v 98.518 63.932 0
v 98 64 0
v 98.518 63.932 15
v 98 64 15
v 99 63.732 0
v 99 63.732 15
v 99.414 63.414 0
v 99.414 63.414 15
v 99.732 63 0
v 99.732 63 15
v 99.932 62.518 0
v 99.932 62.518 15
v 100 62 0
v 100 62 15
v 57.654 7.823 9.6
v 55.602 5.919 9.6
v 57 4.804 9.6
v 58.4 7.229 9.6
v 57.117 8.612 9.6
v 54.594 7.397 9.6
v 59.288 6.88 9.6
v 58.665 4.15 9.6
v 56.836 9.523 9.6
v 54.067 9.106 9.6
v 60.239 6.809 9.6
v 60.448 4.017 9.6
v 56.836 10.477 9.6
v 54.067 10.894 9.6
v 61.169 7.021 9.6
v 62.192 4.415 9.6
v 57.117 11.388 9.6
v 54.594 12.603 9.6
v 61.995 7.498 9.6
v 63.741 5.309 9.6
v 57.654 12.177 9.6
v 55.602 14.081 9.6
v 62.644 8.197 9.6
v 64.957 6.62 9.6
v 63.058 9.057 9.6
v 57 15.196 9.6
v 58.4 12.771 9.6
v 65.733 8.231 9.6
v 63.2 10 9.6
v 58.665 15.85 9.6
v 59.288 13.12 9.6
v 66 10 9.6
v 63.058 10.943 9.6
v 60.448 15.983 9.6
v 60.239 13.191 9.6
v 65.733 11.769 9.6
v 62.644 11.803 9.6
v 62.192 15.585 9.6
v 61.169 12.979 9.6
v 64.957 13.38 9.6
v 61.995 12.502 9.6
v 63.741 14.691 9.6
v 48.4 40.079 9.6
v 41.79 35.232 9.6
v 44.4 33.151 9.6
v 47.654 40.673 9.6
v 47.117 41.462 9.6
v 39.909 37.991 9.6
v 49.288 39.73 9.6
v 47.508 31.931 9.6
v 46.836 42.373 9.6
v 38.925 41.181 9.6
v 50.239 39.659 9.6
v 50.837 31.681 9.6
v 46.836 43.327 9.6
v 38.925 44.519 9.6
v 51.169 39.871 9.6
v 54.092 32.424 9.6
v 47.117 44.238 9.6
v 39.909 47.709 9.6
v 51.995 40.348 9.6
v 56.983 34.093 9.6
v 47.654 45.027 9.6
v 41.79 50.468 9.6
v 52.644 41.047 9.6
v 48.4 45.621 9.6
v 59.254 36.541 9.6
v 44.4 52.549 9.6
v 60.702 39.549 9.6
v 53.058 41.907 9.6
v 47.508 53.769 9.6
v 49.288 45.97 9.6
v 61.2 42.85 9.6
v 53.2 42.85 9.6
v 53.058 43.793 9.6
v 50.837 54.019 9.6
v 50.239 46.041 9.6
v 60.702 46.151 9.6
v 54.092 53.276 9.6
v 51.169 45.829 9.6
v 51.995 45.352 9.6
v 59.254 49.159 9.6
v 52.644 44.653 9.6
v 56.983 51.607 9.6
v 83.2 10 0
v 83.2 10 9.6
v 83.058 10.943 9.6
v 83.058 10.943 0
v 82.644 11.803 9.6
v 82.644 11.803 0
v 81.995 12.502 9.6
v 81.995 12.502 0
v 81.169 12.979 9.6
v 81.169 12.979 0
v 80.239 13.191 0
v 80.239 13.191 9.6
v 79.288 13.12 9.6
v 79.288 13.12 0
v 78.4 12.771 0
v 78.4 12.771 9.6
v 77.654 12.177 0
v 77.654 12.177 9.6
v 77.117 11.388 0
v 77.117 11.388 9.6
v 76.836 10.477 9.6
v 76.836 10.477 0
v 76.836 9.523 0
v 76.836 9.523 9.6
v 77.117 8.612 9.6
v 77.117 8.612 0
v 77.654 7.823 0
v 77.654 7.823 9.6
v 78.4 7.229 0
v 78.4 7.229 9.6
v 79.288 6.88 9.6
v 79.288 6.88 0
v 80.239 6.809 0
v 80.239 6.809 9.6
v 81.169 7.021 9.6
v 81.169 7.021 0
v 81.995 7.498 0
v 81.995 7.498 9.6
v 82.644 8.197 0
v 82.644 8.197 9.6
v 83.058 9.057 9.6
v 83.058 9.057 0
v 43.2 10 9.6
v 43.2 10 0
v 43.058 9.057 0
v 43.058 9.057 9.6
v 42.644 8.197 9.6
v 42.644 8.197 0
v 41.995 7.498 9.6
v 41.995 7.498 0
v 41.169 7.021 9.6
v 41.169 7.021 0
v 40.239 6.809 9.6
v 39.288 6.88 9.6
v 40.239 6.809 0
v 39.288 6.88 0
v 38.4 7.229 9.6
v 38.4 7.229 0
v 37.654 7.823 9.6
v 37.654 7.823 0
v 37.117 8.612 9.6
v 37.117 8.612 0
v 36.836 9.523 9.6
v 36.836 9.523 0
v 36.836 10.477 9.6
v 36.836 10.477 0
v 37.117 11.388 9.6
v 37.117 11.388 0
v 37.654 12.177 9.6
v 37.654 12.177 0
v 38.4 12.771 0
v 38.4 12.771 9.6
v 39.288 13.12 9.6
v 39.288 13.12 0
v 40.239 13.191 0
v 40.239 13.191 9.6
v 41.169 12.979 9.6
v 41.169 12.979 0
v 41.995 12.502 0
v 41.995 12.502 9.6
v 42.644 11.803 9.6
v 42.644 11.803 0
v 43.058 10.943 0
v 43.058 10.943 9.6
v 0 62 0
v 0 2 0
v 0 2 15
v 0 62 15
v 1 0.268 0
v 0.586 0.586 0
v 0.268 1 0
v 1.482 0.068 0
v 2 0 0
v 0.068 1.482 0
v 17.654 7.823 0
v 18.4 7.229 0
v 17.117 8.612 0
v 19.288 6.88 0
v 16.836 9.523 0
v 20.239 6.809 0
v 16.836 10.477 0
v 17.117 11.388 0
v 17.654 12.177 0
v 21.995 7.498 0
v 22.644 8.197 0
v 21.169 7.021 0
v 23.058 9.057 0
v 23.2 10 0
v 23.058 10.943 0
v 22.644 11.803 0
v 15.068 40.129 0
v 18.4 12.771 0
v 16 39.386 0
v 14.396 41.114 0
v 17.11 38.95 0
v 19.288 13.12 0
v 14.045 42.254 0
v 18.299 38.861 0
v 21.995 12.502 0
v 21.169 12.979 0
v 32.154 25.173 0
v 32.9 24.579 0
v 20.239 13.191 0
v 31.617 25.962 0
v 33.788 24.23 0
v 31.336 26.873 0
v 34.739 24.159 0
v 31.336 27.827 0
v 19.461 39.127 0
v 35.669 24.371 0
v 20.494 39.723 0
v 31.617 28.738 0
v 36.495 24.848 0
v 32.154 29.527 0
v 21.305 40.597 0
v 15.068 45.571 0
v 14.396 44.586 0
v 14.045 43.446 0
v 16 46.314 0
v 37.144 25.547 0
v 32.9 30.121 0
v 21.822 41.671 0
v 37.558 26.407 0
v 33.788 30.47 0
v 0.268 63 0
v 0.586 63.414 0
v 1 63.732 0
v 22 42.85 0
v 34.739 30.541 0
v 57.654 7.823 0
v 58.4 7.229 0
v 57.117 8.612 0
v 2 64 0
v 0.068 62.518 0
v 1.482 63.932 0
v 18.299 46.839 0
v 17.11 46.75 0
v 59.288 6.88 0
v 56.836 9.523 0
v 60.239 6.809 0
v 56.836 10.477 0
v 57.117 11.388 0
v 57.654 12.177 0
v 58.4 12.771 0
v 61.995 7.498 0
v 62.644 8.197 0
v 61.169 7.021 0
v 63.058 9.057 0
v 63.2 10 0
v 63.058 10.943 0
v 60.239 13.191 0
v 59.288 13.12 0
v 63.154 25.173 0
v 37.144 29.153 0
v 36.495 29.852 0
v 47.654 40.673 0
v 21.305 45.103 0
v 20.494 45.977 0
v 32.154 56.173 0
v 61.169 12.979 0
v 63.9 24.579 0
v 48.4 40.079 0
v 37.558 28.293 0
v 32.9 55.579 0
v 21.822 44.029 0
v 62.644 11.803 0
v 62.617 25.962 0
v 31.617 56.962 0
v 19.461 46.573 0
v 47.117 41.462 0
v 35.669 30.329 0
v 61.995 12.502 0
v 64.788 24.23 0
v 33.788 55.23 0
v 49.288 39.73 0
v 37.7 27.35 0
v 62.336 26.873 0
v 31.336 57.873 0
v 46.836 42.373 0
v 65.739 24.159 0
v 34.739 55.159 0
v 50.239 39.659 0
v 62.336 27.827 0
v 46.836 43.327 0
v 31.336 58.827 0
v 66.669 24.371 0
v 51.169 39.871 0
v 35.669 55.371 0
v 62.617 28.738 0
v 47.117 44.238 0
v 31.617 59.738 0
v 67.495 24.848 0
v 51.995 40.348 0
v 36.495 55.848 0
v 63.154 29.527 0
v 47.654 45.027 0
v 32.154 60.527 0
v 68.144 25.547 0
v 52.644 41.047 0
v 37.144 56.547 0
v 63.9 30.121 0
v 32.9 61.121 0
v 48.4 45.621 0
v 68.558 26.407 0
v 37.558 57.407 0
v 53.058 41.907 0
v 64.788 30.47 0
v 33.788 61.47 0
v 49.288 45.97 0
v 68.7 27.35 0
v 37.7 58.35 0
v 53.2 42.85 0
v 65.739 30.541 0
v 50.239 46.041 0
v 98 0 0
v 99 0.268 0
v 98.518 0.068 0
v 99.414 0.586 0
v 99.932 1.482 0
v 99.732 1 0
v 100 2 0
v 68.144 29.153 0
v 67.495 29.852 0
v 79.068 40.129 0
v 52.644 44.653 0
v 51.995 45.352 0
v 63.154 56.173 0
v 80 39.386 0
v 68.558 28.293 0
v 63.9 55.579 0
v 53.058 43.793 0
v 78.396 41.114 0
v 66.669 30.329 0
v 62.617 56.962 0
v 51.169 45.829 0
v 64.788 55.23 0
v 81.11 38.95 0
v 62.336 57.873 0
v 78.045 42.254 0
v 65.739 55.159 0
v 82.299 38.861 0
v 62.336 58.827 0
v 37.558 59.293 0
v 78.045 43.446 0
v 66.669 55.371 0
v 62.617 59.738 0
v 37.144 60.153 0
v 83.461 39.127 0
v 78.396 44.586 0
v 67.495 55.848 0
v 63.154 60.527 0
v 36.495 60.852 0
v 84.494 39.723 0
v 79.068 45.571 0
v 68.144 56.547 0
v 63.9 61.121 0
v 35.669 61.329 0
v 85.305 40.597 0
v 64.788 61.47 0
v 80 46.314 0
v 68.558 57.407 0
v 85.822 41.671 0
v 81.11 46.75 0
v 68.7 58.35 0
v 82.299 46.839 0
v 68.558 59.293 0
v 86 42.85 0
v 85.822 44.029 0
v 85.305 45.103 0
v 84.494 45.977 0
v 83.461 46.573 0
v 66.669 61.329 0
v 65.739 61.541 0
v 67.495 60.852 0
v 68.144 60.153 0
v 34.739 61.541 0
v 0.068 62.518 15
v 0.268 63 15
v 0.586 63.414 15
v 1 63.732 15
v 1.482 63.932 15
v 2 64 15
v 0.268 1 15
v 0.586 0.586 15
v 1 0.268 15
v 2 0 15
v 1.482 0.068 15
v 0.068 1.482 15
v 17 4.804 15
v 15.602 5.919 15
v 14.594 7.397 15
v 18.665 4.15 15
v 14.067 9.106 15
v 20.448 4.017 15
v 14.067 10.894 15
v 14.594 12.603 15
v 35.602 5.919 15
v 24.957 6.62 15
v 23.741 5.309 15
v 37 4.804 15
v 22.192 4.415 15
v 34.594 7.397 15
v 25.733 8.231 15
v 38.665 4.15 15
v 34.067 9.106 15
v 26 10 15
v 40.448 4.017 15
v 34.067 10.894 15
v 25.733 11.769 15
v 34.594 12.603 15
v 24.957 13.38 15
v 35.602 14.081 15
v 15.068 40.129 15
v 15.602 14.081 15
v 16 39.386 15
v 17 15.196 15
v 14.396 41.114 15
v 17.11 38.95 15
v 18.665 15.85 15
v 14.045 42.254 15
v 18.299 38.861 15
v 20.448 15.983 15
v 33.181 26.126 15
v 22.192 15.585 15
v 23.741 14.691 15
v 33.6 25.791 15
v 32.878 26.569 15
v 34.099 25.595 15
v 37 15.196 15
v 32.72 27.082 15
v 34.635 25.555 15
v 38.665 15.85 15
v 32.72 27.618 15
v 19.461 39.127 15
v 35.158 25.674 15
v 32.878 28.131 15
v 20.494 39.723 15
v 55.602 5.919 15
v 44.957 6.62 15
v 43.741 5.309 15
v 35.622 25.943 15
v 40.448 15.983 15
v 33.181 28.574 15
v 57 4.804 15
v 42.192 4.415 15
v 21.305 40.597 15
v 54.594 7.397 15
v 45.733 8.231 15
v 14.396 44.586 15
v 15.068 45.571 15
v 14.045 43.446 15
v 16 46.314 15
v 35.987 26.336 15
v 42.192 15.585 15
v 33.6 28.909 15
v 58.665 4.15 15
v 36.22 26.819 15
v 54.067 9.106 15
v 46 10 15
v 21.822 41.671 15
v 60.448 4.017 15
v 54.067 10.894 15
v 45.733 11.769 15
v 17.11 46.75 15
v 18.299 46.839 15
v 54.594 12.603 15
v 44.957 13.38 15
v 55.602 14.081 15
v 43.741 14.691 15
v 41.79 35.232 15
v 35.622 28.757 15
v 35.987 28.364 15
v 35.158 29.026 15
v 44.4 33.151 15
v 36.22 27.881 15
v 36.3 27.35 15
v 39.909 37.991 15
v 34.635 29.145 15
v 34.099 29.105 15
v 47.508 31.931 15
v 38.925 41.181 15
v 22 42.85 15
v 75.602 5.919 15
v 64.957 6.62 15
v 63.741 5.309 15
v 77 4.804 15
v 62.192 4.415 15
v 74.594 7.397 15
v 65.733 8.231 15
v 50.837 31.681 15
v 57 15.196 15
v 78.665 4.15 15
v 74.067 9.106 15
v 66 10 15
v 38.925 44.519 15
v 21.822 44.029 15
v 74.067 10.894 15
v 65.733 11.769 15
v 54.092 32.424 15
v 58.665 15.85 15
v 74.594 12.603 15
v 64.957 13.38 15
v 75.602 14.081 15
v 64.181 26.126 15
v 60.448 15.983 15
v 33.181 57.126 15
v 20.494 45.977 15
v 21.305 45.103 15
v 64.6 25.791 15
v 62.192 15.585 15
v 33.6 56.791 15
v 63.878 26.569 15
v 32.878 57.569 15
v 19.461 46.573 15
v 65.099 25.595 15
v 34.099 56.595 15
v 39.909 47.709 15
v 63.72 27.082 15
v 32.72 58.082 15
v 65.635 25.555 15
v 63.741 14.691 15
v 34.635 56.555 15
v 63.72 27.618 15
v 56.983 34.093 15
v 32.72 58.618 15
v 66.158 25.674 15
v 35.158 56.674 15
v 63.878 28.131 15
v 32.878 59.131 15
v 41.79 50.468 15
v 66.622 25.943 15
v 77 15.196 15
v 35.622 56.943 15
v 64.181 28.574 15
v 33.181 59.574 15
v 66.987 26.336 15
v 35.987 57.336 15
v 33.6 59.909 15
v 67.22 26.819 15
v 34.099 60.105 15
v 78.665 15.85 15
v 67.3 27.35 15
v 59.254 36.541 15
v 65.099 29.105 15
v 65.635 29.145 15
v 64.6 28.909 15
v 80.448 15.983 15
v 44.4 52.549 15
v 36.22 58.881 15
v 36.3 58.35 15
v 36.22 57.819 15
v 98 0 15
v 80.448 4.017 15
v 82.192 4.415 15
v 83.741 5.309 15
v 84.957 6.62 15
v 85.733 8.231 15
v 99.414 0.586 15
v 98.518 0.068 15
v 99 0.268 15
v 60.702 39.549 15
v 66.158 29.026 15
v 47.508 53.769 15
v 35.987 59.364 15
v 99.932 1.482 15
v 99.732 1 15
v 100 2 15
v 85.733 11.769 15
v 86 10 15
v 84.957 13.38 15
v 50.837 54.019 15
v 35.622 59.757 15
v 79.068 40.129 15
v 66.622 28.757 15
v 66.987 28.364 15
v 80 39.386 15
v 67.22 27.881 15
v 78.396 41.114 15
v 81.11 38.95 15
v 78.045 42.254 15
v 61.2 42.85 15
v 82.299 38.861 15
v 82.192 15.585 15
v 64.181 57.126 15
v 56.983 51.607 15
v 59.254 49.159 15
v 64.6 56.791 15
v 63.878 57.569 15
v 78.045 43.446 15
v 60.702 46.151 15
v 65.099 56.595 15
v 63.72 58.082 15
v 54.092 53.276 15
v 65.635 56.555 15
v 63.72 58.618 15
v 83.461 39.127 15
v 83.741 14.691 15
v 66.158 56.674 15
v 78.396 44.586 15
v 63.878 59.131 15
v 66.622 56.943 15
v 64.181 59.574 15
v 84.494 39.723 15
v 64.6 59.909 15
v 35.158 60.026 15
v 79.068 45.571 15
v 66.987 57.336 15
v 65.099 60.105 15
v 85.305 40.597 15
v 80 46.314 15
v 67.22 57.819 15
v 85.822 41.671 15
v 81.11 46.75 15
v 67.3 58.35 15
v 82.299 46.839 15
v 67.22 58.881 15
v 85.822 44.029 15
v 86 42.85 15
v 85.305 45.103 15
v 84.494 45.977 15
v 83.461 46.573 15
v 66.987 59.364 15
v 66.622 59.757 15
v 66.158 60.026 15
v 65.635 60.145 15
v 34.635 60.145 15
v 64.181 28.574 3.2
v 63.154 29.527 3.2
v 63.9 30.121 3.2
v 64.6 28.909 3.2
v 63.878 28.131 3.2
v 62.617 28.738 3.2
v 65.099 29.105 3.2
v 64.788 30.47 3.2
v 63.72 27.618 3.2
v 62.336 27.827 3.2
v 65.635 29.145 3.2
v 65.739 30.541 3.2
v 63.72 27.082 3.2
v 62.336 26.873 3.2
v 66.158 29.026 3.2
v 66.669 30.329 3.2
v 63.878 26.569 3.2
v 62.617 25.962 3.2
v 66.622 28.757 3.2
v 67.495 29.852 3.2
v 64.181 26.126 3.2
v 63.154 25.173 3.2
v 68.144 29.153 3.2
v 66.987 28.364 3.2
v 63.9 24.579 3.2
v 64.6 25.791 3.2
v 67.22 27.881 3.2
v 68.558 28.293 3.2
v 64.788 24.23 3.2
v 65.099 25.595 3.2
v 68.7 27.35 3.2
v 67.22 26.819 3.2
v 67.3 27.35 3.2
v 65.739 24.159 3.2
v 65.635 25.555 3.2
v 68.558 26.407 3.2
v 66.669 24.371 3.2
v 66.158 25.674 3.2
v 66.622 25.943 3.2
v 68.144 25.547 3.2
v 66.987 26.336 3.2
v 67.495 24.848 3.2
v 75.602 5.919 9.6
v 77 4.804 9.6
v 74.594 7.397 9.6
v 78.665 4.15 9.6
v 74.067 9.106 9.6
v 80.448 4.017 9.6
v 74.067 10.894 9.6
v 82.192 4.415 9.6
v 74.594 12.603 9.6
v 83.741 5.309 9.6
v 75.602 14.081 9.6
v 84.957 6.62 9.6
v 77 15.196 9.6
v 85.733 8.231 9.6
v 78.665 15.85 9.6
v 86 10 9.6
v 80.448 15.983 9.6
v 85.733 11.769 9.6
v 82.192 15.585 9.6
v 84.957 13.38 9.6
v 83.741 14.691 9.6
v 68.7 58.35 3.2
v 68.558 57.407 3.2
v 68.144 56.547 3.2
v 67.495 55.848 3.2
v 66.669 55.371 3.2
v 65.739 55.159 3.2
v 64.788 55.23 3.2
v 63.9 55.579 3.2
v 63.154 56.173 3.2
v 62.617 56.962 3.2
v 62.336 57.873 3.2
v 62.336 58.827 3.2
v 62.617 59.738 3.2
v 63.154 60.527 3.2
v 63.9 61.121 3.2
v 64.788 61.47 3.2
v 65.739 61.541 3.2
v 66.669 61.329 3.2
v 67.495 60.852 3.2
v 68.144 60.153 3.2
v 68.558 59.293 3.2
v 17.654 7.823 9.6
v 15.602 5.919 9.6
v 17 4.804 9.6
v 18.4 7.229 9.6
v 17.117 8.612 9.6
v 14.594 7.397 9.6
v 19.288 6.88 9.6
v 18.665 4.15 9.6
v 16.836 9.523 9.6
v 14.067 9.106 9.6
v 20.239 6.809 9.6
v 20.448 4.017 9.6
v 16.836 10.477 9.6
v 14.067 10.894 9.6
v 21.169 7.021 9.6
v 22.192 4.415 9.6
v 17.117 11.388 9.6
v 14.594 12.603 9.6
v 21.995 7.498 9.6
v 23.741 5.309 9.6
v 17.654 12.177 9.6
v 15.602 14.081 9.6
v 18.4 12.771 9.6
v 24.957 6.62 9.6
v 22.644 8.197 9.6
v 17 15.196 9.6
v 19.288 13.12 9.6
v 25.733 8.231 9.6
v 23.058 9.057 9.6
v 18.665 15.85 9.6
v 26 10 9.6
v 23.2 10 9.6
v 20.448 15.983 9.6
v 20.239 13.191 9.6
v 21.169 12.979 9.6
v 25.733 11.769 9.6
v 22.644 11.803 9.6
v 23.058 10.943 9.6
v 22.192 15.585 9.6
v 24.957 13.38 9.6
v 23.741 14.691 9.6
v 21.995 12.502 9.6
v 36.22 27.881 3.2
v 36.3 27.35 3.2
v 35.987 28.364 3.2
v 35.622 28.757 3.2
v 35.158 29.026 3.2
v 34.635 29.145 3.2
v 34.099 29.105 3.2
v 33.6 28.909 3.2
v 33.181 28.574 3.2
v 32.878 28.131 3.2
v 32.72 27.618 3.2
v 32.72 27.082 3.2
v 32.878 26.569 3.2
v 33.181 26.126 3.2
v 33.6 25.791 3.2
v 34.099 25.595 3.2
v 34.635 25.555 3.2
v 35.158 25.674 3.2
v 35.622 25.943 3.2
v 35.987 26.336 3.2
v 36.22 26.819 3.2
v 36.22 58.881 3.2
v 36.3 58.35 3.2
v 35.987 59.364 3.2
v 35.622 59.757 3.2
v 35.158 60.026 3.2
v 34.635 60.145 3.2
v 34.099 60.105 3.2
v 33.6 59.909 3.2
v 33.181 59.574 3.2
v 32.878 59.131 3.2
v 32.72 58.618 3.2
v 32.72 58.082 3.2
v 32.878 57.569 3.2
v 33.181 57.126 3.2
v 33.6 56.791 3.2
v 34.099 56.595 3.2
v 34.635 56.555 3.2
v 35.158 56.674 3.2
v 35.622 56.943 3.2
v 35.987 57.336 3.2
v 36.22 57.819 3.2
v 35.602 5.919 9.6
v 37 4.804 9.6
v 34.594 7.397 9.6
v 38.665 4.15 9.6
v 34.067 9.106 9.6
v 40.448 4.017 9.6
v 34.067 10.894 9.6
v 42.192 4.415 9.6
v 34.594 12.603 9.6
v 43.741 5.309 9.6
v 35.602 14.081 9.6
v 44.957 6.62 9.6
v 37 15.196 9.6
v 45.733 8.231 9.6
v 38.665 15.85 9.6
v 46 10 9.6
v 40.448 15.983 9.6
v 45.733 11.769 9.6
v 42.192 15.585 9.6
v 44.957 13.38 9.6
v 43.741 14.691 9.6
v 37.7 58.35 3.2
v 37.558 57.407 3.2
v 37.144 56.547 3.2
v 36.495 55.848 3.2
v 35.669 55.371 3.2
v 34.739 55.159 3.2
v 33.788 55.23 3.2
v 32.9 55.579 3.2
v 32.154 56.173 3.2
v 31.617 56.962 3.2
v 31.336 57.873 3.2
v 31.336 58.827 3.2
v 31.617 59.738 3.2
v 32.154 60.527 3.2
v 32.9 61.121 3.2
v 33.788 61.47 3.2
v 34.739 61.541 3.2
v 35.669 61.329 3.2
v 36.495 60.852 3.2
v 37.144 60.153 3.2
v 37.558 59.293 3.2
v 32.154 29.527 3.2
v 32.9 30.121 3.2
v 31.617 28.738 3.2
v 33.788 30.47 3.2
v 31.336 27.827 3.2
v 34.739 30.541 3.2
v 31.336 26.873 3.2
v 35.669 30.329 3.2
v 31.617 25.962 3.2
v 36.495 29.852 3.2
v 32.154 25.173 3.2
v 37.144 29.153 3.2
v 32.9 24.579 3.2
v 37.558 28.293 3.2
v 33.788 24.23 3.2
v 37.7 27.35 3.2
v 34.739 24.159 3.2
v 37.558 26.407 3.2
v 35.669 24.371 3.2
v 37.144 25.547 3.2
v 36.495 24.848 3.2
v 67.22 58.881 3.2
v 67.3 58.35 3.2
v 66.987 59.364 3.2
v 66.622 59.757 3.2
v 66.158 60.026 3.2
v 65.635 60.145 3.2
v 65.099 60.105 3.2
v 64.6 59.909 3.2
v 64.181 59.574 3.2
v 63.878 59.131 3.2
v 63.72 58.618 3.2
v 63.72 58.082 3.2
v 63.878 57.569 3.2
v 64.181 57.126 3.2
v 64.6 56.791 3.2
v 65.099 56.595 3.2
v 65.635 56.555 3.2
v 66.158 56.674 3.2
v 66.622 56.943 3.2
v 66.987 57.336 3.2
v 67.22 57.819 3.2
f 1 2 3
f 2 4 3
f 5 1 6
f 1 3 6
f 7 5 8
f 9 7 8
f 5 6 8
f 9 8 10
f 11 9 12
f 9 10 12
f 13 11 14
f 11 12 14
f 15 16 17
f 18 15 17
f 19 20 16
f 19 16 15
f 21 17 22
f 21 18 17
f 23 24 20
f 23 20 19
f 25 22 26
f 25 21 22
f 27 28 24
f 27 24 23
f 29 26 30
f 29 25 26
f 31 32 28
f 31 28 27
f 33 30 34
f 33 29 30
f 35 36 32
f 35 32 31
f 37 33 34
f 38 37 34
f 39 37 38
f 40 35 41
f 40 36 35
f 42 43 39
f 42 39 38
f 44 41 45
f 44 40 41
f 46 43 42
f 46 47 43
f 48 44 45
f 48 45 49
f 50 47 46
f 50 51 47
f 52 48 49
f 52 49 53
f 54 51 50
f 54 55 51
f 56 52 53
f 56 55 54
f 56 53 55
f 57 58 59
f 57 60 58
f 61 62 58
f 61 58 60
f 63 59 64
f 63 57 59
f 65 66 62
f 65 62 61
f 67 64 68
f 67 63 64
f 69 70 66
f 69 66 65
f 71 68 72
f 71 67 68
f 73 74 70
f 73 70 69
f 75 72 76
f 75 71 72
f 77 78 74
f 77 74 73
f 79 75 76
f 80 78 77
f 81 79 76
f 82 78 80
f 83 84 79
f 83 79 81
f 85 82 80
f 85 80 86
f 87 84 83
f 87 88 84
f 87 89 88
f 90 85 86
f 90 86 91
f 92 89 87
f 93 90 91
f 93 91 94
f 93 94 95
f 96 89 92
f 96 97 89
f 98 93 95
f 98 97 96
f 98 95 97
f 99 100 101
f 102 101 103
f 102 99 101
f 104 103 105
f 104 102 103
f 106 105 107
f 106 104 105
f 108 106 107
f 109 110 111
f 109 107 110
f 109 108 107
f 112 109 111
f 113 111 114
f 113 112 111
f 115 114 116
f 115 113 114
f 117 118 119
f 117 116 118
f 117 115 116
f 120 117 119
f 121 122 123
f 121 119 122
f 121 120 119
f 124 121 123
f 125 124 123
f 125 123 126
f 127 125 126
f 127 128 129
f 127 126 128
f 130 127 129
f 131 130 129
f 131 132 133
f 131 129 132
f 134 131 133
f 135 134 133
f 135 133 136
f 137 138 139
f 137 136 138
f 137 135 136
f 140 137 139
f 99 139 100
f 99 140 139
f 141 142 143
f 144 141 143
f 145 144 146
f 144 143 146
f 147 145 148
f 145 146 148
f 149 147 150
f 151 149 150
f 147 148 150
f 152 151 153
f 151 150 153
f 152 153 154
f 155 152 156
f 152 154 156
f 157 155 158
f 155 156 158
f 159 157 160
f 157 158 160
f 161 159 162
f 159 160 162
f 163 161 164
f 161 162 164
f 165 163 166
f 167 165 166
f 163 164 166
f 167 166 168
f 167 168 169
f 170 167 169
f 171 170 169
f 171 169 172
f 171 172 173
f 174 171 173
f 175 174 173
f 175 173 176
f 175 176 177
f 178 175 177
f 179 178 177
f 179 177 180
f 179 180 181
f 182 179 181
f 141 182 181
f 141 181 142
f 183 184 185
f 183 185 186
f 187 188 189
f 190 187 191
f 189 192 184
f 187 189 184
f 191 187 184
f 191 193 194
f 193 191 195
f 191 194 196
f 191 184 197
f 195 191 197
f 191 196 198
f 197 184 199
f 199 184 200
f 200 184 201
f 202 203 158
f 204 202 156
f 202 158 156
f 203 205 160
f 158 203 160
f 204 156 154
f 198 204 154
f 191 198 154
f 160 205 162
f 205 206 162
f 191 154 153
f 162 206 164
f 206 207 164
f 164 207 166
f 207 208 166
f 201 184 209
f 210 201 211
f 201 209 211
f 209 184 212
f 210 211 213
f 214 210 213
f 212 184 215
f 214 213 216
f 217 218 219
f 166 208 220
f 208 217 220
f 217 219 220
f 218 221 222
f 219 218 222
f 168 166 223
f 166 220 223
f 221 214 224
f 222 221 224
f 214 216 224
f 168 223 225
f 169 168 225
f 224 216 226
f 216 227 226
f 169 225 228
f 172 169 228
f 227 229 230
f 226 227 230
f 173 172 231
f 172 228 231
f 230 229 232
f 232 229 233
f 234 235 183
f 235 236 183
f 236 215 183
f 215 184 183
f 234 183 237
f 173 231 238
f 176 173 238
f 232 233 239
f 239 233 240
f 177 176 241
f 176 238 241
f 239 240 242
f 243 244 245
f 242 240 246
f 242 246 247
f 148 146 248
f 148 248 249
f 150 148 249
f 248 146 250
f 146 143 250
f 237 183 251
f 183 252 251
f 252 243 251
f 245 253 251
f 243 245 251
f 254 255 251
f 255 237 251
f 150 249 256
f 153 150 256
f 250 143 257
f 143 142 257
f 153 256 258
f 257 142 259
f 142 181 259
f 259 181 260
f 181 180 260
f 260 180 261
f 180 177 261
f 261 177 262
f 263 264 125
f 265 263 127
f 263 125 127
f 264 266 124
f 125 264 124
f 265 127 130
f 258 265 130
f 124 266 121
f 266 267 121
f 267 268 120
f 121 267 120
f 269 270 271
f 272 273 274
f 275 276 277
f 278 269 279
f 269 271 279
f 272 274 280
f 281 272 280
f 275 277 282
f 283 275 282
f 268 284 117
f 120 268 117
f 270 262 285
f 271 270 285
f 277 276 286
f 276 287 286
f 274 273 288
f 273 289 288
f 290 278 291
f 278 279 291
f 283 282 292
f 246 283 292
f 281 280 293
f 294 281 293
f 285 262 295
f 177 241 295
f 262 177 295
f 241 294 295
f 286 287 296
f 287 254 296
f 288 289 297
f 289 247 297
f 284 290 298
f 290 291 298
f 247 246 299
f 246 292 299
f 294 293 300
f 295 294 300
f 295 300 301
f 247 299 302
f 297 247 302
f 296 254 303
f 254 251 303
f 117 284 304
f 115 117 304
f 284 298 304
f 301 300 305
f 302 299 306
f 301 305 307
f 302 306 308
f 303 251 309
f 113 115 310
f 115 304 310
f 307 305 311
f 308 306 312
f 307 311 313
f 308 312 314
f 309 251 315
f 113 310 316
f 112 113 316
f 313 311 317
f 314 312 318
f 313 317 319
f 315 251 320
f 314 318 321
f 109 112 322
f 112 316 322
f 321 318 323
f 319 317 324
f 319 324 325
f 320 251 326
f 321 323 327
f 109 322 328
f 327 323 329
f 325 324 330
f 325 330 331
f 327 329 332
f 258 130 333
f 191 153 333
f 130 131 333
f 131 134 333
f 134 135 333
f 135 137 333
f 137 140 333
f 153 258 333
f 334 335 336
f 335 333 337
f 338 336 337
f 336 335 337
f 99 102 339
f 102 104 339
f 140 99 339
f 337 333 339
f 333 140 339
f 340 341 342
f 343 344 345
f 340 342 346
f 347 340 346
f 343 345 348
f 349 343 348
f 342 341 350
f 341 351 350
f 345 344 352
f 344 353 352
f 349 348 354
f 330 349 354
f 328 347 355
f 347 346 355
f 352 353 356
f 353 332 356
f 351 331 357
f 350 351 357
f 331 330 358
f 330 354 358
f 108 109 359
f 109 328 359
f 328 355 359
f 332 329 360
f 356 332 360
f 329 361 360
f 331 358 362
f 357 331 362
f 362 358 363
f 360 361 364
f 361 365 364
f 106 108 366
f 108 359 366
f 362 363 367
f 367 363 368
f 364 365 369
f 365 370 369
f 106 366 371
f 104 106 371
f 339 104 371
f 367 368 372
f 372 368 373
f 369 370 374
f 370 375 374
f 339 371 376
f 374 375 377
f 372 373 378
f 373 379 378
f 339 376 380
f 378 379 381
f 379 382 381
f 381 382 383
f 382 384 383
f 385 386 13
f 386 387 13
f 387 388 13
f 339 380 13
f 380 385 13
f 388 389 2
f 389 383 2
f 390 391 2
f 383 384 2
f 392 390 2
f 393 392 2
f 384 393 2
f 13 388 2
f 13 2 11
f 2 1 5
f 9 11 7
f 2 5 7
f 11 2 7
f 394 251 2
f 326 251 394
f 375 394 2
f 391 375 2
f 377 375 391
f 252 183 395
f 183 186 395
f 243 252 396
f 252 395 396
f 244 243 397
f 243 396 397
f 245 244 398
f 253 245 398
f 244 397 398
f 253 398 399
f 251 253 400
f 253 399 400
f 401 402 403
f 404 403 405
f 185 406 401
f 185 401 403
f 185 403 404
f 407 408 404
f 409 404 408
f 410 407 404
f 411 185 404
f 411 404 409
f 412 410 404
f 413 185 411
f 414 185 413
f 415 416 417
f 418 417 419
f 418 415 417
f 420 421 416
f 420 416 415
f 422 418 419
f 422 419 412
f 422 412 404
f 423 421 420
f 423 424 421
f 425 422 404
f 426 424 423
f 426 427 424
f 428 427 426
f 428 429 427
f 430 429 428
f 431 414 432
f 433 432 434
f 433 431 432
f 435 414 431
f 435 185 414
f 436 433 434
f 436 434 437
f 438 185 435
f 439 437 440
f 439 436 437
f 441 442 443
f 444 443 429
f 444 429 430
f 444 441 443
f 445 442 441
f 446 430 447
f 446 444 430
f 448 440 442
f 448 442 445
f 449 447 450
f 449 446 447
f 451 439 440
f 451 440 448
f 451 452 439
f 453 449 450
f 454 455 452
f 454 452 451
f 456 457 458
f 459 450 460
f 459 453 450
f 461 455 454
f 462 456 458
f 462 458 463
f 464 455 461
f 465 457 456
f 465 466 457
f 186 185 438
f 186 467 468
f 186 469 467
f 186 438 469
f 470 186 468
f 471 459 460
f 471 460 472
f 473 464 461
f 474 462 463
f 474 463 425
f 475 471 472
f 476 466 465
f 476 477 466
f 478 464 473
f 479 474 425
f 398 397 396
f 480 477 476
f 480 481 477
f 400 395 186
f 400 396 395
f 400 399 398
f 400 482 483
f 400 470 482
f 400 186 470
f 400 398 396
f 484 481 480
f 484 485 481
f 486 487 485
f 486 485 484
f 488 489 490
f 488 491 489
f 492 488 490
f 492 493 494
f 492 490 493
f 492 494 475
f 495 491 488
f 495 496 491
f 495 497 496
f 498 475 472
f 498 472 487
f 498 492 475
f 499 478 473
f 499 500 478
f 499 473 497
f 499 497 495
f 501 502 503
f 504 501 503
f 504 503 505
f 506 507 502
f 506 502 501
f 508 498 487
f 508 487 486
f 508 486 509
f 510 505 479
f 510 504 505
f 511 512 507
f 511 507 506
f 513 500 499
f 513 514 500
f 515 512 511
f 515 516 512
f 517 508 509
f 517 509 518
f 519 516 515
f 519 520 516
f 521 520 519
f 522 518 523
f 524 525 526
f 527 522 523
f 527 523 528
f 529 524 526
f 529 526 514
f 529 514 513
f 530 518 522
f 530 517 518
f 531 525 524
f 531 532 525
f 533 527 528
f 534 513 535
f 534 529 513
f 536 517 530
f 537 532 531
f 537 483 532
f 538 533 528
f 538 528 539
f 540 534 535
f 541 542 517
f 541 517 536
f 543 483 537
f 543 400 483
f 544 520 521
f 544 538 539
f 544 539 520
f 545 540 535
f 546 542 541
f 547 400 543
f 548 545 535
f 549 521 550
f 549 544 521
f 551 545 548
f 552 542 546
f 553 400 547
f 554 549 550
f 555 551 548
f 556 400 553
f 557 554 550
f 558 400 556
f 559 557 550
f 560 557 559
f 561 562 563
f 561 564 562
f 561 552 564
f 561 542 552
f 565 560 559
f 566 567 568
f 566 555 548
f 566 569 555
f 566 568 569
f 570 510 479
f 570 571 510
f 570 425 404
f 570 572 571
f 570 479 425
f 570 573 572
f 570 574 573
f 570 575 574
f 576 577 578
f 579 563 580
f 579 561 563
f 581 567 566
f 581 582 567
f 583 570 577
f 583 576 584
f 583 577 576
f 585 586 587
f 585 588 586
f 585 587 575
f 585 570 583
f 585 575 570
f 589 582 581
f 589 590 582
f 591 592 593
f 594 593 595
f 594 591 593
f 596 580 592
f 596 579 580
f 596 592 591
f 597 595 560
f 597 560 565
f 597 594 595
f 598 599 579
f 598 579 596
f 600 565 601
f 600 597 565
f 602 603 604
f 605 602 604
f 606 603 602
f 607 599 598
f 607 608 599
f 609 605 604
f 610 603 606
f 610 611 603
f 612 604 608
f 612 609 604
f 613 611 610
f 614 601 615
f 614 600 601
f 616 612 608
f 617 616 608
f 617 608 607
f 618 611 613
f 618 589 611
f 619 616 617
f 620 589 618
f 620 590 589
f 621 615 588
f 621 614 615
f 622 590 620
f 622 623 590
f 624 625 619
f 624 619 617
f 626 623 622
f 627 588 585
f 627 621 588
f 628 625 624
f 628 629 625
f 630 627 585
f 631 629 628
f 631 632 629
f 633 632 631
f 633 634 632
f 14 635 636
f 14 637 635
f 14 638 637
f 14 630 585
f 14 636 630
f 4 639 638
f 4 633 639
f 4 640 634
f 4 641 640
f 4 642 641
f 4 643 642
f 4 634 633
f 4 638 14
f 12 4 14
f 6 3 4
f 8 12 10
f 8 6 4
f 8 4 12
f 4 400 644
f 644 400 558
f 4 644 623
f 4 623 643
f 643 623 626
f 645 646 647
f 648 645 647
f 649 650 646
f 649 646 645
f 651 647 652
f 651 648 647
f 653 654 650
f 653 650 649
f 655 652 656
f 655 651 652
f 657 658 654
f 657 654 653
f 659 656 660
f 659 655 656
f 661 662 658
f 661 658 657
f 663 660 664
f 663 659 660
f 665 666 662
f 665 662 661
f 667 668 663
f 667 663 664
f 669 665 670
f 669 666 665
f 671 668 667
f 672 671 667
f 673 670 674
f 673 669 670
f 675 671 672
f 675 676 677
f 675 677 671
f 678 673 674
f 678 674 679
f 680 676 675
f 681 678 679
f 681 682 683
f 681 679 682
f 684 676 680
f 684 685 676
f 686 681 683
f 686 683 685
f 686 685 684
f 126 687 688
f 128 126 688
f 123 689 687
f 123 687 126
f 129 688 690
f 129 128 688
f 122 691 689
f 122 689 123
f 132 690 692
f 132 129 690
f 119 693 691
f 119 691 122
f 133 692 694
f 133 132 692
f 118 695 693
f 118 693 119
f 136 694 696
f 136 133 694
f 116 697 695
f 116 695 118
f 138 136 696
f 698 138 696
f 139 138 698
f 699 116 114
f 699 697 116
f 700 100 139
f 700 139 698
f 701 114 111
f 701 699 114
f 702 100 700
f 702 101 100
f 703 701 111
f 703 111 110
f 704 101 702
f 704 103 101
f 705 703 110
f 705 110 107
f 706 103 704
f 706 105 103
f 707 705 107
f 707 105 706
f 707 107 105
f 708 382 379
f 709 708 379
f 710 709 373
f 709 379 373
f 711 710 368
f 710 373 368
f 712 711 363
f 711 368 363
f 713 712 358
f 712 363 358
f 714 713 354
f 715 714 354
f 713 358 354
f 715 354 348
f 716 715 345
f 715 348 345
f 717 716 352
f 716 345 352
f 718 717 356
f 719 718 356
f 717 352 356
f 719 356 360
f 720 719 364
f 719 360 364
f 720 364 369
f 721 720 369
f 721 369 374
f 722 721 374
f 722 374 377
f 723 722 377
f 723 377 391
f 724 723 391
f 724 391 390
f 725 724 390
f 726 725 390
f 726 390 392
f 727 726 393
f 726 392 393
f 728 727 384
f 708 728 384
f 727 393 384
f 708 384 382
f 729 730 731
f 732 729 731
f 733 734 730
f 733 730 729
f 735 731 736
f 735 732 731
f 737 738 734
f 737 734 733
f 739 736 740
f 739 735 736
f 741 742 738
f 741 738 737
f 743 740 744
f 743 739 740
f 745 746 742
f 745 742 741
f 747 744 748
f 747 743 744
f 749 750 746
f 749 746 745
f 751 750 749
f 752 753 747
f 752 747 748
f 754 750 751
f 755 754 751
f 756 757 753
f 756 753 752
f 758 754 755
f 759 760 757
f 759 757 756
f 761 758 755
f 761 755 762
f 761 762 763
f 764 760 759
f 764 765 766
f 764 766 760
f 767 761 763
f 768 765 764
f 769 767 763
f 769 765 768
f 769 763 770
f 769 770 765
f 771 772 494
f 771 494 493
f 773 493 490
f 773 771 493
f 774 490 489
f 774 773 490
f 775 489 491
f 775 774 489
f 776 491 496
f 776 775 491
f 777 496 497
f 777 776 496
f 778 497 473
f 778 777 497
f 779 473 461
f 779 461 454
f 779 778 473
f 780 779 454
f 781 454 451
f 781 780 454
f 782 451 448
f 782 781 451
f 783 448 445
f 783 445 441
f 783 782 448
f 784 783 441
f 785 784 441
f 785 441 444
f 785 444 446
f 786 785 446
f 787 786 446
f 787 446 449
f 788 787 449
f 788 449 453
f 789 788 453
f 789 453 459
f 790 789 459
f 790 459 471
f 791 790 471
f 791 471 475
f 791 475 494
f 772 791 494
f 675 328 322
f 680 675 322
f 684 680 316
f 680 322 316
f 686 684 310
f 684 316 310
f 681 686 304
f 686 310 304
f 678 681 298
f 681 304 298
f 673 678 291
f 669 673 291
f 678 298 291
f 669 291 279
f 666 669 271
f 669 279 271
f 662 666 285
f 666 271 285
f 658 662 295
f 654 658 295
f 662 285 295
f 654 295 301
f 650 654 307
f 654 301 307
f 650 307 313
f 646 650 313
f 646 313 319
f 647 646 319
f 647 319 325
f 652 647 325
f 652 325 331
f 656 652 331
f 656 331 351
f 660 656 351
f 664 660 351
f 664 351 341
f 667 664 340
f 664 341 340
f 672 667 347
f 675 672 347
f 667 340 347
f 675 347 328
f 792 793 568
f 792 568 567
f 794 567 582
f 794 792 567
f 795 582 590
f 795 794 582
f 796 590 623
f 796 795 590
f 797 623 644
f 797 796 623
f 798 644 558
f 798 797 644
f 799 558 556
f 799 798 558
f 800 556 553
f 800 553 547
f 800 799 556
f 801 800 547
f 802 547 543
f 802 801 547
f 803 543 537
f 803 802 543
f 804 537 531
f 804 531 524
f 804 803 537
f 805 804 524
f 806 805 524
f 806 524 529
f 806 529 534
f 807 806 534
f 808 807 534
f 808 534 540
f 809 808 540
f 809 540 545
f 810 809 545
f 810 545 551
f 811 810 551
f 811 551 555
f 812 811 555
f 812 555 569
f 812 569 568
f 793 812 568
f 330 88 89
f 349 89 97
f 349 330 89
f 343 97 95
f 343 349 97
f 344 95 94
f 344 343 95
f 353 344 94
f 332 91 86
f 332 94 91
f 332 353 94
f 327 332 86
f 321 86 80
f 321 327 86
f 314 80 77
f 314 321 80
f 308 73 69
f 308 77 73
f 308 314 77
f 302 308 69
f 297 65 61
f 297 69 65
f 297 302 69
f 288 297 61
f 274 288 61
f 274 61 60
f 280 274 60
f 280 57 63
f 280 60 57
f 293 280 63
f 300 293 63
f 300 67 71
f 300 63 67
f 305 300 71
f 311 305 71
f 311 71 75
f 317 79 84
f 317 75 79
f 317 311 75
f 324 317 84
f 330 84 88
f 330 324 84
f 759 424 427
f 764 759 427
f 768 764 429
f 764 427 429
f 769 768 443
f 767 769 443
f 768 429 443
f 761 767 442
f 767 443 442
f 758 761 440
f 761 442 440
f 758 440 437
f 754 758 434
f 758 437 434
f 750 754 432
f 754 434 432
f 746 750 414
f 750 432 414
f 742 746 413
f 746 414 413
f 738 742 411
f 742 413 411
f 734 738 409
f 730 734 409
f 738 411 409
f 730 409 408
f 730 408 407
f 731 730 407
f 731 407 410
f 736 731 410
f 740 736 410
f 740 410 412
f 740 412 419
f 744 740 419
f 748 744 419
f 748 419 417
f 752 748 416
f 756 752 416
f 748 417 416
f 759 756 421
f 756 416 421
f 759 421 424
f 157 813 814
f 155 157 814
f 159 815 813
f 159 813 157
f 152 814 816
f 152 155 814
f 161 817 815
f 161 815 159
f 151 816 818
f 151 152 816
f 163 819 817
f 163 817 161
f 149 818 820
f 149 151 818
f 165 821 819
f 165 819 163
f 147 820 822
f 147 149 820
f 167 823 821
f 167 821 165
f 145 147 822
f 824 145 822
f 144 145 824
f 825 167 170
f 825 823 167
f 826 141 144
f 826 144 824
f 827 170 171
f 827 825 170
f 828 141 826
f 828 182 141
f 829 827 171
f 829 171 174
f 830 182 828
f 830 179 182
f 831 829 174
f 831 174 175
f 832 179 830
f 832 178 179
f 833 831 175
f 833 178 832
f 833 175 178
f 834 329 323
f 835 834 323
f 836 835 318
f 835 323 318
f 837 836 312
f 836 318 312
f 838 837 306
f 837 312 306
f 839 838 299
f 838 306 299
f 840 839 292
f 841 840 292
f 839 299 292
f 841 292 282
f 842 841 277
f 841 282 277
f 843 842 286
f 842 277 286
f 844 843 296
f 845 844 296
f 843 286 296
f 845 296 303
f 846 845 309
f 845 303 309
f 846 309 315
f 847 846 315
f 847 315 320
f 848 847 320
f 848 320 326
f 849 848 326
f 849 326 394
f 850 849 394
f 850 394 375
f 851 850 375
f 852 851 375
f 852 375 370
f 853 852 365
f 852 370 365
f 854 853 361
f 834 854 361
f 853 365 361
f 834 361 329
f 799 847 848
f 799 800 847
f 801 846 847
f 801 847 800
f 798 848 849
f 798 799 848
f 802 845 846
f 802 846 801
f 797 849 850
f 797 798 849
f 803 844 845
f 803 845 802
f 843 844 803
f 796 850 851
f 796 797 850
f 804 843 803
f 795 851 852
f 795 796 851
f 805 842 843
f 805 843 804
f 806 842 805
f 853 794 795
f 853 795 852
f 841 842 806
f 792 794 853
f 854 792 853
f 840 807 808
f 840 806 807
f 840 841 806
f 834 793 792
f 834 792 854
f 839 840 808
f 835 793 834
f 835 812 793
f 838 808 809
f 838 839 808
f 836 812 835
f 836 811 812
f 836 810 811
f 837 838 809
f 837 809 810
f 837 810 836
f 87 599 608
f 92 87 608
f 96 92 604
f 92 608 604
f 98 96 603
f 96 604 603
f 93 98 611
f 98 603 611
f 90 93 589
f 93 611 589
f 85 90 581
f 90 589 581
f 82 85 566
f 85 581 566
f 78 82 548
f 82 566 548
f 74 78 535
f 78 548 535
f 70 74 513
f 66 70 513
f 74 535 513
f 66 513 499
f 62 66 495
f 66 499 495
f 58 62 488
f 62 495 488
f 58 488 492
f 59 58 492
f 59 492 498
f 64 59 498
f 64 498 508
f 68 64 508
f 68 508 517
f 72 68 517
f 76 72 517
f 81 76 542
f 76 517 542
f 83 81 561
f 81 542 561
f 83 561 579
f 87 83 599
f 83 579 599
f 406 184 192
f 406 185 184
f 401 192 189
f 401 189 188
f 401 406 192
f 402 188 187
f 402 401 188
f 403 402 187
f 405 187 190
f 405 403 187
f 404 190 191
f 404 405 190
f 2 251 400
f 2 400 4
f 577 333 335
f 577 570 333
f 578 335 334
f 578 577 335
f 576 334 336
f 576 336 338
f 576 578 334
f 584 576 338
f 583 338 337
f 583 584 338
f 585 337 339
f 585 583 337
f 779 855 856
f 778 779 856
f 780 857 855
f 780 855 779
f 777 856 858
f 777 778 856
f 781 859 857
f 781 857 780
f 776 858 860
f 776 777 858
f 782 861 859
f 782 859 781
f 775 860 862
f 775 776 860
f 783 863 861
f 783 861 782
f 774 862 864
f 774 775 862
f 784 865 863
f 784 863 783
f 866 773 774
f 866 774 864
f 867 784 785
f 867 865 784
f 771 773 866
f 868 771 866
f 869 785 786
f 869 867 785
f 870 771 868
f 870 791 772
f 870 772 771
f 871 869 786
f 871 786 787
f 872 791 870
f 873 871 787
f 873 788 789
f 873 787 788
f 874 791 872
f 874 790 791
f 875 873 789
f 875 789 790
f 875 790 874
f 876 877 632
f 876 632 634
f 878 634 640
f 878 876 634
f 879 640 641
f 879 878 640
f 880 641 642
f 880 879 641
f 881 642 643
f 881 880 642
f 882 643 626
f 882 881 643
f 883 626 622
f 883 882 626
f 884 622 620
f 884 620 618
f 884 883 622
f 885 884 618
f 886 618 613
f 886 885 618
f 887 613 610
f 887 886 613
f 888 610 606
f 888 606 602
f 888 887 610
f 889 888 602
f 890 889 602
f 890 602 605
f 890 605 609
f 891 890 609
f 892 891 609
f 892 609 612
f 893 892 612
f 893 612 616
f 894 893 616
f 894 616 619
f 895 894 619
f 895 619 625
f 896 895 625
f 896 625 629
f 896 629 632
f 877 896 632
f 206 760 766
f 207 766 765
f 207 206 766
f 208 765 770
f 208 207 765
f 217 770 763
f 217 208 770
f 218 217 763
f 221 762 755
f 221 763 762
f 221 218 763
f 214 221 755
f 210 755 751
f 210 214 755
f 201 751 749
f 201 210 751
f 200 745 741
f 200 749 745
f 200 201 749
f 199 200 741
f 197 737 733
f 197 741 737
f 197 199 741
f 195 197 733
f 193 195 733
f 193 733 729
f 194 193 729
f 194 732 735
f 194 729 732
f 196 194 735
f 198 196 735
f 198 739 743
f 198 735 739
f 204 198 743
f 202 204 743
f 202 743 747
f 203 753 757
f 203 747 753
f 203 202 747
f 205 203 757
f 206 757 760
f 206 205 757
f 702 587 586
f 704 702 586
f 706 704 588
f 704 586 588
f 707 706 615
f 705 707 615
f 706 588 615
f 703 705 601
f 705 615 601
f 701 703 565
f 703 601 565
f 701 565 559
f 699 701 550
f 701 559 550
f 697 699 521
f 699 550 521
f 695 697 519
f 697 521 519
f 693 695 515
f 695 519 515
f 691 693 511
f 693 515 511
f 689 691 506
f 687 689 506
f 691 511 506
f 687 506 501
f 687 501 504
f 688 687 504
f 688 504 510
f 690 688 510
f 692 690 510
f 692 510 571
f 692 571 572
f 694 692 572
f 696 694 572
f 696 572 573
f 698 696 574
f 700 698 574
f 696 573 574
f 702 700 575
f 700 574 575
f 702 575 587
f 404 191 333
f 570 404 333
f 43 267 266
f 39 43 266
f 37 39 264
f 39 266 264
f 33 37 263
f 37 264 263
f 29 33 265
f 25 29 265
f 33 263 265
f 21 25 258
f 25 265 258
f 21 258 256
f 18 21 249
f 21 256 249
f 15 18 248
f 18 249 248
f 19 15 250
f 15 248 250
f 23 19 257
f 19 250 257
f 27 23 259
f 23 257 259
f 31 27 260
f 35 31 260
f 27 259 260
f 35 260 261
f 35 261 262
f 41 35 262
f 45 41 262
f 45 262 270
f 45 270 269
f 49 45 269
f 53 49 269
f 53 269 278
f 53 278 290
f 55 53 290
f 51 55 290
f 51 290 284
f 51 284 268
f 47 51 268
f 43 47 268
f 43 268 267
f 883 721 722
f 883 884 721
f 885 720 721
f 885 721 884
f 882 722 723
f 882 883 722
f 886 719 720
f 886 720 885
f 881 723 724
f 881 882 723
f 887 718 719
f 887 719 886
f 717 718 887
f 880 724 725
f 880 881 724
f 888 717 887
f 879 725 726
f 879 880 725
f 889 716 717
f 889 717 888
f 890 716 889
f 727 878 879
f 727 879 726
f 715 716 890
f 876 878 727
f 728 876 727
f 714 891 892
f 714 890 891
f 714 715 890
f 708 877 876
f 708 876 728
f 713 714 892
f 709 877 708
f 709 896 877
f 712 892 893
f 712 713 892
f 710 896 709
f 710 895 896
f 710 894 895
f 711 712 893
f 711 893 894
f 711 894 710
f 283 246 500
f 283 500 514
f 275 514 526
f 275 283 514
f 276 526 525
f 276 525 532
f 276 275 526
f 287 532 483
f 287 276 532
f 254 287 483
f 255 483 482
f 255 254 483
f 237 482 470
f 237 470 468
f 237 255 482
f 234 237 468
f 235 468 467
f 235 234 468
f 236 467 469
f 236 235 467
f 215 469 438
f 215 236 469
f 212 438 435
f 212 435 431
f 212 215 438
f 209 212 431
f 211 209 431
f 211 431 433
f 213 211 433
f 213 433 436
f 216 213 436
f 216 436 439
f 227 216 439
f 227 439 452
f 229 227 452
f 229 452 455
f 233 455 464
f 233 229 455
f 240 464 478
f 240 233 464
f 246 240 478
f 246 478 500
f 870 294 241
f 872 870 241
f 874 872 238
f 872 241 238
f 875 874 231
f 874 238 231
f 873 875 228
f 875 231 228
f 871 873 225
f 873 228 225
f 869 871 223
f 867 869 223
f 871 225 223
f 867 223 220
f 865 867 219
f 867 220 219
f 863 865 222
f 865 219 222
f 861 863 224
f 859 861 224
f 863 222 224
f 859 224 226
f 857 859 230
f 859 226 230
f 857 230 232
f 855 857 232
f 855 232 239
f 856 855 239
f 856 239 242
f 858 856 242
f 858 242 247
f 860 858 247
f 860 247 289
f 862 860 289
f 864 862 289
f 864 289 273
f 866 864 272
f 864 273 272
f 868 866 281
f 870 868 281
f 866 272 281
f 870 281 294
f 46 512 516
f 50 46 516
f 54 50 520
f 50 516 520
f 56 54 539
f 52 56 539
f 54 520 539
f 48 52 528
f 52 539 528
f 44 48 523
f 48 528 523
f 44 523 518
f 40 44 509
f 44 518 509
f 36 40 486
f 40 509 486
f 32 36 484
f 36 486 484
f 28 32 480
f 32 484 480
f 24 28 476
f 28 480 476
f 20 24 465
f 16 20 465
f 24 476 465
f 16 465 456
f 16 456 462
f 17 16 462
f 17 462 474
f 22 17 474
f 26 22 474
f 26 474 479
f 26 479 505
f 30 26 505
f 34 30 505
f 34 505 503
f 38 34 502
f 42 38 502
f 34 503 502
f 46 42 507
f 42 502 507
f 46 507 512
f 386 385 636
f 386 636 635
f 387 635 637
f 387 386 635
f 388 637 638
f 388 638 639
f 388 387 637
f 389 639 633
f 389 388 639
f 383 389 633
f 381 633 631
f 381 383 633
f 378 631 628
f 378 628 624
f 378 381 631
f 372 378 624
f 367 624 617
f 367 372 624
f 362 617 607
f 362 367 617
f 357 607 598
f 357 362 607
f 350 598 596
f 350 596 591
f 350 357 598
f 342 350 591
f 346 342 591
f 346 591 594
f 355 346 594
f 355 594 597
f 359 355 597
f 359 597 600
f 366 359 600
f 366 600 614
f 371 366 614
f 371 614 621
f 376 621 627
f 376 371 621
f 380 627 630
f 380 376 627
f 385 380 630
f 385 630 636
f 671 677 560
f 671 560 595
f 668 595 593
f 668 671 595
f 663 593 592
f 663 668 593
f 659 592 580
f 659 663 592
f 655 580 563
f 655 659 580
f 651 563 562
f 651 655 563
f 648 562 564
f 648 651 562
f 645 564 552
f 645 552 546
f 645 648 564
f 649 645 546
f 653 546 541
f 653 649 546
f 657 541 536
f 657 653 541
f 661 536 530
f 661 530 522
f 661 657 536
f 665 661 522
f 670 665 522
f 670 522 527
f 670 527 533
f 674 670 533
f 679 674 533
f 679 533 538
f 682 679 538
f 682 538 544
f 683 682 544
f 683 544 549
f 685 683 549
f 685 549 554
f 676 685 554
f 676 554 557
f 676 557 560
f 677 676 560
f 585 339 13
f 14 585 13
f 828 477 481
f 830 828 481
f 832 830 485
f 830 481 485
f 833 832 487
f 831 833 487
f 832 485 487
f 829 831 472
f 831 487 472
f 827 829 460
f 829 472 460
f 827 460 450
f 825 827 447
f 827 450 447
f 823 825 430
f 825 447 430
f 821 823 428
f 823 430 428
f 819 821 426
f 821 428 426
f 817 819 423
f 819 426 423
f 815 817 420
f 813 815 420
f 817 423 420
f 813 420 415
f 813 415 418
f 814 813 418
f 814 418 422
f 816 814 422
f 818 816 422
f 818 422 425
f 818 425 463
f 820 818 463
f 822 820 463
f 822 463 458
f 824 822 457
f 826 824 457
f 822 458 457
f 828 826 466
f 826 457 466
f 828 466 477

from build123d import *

# Parameters (mm, degrees)
SKETCH_W        = 100
SKETCH_H        = 64
SKETCH_R        = 3.2
SKETCH_R_2      = 1.8
SKETCH_R_3      = 4
PAD_DEPTH       = 15
SKETCH001_R     = 11.2
SKETCH001_R_2   = 6
POCKET_DEPTH    = 5.4
SKETCH002_R     = 3.2
POCKET001_DEPTH = 3.2
SKETCH003_R     = 6
POCKET002_DEPTH = 5.4
SKETCH004_R     = 3.2
POCKET003_DEPTH = 15
FILLET_R        = 2


with BuildPart() as part:
    # Sketch → Pad (new body)
    with BuildSketch(Plane.XY):
        with Locations((50, 32)):
            Rectangle(SKETCH_W, SKETCH_H)
        with Locations((50, 42.85)):
            Circle(SKETCH_R, mode=Mode.SUBTRACT)
        with Locations((65.5, 58.35)):
            Circle(SKETCH_R_2, mode=Mode.SUBTRACT)
        with Locations((65.5, 27.35)):
            Circle(SKETCH_R_2, mode=Mode.SUBTRACT)
        with Locations((34.5, 27.35)):
            Circle(SKETCH_R_2, mode=Mode.SUBTRACT)
        with Locations((34.5, 58.35)):
            Circle(SKETCH_R_2, mode=Mode.SUBTRACT)
        with Locations((20, 10)):
            Circle(SKETCH_R, mode=Mode.SUBTRACT)
        with Locations((80, 10)):
            Circle(SKETCH_R, mode=Mode.SUBTRACT)
        with Locations((82, 42.85)):
            Circle(SKETCH_R_3, mode=Mode.SUBTRACT)
        with Locations((18, 42.85)):
            Circle(SKETCH_R_3, mode=Mode.SUBTRACT)
    extrude(amount=PAD_DEPTH)

    # Sketch001 (on Face15 of Pad) → Pocket (cut)
    with BuildSketch(Plane.XY.offset(15)):
        with Locations((50, 42.85)):
            Circle(SKETCH001_R)
        with Locations((20, 10)):
            Circle(SKETCH001_R_2)
        with Locations((80, 10)):
            Circle(SKETCH001_R_2)
    extrude(amount=-POCKET_DEPTH, mode=Mode.SUBTRACT)

    # Sketch002 (on Face4 of Pocket) → Pocket001 (cut)
    with BuildSketch(Plane(origin=(0, 0, 0), x_dir=(1, 0, 0), z_dir=(0, 0, -1))):
        with Locations((34.5, -27.35)):
            Circle(SKETCH002_R)
        with Locations((65.5, -27.35)):
            Circle(SKETCH002_R)
        with Locations((34.5, -58.35)):
            Circle(SKETCH002_R)
        with Locations((65.5, -58.35)):
            Circle(SKETCH002_R)
    extrude(amount=-POCKET001_DEPTH, mode=Mode.SUBTRACT)

    # Sketch003 (on Face5 of Pocket001) → Pocket002 (cut)
    with BuildSketch(Plane.XY.offset(15)):
        with Locations((40, 10)):
            Circle(SKETCH003_R)
        with Locations((60, 10)):
            Circle(SKETCH003_R)
    extrude(amount=-POCKET002_DEPTH, mode=Mode.SUBTRACT)

    # Sketch004 (on Face4 of Pocket002) → Pocket003 (cut)
    with BuildSketch(Plane(origin=(0, 0, 0), x_dir=(1, 0, 0), z_dir=(0, 0, -1))):
        with Locations((40, -10)):
            Circle(SKETCH004_R)
        with Locations((60, -10)):
            Circle(SKETCH004_R)
    extrude(amount=-POCKET003_DEPTH, mode=Mode.SUBTRACT)

    # Fillet
    fillet_edges = [part.edges().sort_by_distance(p)[0] for p in [
        (0, 64, 7.5),
        (100, 64, 7.5),
        (100, 0, 7.5),
        (0, 0, 7.5),
    ]]
    fillet(fillet_edges, radius=FILLET_R)


solid = part.part
